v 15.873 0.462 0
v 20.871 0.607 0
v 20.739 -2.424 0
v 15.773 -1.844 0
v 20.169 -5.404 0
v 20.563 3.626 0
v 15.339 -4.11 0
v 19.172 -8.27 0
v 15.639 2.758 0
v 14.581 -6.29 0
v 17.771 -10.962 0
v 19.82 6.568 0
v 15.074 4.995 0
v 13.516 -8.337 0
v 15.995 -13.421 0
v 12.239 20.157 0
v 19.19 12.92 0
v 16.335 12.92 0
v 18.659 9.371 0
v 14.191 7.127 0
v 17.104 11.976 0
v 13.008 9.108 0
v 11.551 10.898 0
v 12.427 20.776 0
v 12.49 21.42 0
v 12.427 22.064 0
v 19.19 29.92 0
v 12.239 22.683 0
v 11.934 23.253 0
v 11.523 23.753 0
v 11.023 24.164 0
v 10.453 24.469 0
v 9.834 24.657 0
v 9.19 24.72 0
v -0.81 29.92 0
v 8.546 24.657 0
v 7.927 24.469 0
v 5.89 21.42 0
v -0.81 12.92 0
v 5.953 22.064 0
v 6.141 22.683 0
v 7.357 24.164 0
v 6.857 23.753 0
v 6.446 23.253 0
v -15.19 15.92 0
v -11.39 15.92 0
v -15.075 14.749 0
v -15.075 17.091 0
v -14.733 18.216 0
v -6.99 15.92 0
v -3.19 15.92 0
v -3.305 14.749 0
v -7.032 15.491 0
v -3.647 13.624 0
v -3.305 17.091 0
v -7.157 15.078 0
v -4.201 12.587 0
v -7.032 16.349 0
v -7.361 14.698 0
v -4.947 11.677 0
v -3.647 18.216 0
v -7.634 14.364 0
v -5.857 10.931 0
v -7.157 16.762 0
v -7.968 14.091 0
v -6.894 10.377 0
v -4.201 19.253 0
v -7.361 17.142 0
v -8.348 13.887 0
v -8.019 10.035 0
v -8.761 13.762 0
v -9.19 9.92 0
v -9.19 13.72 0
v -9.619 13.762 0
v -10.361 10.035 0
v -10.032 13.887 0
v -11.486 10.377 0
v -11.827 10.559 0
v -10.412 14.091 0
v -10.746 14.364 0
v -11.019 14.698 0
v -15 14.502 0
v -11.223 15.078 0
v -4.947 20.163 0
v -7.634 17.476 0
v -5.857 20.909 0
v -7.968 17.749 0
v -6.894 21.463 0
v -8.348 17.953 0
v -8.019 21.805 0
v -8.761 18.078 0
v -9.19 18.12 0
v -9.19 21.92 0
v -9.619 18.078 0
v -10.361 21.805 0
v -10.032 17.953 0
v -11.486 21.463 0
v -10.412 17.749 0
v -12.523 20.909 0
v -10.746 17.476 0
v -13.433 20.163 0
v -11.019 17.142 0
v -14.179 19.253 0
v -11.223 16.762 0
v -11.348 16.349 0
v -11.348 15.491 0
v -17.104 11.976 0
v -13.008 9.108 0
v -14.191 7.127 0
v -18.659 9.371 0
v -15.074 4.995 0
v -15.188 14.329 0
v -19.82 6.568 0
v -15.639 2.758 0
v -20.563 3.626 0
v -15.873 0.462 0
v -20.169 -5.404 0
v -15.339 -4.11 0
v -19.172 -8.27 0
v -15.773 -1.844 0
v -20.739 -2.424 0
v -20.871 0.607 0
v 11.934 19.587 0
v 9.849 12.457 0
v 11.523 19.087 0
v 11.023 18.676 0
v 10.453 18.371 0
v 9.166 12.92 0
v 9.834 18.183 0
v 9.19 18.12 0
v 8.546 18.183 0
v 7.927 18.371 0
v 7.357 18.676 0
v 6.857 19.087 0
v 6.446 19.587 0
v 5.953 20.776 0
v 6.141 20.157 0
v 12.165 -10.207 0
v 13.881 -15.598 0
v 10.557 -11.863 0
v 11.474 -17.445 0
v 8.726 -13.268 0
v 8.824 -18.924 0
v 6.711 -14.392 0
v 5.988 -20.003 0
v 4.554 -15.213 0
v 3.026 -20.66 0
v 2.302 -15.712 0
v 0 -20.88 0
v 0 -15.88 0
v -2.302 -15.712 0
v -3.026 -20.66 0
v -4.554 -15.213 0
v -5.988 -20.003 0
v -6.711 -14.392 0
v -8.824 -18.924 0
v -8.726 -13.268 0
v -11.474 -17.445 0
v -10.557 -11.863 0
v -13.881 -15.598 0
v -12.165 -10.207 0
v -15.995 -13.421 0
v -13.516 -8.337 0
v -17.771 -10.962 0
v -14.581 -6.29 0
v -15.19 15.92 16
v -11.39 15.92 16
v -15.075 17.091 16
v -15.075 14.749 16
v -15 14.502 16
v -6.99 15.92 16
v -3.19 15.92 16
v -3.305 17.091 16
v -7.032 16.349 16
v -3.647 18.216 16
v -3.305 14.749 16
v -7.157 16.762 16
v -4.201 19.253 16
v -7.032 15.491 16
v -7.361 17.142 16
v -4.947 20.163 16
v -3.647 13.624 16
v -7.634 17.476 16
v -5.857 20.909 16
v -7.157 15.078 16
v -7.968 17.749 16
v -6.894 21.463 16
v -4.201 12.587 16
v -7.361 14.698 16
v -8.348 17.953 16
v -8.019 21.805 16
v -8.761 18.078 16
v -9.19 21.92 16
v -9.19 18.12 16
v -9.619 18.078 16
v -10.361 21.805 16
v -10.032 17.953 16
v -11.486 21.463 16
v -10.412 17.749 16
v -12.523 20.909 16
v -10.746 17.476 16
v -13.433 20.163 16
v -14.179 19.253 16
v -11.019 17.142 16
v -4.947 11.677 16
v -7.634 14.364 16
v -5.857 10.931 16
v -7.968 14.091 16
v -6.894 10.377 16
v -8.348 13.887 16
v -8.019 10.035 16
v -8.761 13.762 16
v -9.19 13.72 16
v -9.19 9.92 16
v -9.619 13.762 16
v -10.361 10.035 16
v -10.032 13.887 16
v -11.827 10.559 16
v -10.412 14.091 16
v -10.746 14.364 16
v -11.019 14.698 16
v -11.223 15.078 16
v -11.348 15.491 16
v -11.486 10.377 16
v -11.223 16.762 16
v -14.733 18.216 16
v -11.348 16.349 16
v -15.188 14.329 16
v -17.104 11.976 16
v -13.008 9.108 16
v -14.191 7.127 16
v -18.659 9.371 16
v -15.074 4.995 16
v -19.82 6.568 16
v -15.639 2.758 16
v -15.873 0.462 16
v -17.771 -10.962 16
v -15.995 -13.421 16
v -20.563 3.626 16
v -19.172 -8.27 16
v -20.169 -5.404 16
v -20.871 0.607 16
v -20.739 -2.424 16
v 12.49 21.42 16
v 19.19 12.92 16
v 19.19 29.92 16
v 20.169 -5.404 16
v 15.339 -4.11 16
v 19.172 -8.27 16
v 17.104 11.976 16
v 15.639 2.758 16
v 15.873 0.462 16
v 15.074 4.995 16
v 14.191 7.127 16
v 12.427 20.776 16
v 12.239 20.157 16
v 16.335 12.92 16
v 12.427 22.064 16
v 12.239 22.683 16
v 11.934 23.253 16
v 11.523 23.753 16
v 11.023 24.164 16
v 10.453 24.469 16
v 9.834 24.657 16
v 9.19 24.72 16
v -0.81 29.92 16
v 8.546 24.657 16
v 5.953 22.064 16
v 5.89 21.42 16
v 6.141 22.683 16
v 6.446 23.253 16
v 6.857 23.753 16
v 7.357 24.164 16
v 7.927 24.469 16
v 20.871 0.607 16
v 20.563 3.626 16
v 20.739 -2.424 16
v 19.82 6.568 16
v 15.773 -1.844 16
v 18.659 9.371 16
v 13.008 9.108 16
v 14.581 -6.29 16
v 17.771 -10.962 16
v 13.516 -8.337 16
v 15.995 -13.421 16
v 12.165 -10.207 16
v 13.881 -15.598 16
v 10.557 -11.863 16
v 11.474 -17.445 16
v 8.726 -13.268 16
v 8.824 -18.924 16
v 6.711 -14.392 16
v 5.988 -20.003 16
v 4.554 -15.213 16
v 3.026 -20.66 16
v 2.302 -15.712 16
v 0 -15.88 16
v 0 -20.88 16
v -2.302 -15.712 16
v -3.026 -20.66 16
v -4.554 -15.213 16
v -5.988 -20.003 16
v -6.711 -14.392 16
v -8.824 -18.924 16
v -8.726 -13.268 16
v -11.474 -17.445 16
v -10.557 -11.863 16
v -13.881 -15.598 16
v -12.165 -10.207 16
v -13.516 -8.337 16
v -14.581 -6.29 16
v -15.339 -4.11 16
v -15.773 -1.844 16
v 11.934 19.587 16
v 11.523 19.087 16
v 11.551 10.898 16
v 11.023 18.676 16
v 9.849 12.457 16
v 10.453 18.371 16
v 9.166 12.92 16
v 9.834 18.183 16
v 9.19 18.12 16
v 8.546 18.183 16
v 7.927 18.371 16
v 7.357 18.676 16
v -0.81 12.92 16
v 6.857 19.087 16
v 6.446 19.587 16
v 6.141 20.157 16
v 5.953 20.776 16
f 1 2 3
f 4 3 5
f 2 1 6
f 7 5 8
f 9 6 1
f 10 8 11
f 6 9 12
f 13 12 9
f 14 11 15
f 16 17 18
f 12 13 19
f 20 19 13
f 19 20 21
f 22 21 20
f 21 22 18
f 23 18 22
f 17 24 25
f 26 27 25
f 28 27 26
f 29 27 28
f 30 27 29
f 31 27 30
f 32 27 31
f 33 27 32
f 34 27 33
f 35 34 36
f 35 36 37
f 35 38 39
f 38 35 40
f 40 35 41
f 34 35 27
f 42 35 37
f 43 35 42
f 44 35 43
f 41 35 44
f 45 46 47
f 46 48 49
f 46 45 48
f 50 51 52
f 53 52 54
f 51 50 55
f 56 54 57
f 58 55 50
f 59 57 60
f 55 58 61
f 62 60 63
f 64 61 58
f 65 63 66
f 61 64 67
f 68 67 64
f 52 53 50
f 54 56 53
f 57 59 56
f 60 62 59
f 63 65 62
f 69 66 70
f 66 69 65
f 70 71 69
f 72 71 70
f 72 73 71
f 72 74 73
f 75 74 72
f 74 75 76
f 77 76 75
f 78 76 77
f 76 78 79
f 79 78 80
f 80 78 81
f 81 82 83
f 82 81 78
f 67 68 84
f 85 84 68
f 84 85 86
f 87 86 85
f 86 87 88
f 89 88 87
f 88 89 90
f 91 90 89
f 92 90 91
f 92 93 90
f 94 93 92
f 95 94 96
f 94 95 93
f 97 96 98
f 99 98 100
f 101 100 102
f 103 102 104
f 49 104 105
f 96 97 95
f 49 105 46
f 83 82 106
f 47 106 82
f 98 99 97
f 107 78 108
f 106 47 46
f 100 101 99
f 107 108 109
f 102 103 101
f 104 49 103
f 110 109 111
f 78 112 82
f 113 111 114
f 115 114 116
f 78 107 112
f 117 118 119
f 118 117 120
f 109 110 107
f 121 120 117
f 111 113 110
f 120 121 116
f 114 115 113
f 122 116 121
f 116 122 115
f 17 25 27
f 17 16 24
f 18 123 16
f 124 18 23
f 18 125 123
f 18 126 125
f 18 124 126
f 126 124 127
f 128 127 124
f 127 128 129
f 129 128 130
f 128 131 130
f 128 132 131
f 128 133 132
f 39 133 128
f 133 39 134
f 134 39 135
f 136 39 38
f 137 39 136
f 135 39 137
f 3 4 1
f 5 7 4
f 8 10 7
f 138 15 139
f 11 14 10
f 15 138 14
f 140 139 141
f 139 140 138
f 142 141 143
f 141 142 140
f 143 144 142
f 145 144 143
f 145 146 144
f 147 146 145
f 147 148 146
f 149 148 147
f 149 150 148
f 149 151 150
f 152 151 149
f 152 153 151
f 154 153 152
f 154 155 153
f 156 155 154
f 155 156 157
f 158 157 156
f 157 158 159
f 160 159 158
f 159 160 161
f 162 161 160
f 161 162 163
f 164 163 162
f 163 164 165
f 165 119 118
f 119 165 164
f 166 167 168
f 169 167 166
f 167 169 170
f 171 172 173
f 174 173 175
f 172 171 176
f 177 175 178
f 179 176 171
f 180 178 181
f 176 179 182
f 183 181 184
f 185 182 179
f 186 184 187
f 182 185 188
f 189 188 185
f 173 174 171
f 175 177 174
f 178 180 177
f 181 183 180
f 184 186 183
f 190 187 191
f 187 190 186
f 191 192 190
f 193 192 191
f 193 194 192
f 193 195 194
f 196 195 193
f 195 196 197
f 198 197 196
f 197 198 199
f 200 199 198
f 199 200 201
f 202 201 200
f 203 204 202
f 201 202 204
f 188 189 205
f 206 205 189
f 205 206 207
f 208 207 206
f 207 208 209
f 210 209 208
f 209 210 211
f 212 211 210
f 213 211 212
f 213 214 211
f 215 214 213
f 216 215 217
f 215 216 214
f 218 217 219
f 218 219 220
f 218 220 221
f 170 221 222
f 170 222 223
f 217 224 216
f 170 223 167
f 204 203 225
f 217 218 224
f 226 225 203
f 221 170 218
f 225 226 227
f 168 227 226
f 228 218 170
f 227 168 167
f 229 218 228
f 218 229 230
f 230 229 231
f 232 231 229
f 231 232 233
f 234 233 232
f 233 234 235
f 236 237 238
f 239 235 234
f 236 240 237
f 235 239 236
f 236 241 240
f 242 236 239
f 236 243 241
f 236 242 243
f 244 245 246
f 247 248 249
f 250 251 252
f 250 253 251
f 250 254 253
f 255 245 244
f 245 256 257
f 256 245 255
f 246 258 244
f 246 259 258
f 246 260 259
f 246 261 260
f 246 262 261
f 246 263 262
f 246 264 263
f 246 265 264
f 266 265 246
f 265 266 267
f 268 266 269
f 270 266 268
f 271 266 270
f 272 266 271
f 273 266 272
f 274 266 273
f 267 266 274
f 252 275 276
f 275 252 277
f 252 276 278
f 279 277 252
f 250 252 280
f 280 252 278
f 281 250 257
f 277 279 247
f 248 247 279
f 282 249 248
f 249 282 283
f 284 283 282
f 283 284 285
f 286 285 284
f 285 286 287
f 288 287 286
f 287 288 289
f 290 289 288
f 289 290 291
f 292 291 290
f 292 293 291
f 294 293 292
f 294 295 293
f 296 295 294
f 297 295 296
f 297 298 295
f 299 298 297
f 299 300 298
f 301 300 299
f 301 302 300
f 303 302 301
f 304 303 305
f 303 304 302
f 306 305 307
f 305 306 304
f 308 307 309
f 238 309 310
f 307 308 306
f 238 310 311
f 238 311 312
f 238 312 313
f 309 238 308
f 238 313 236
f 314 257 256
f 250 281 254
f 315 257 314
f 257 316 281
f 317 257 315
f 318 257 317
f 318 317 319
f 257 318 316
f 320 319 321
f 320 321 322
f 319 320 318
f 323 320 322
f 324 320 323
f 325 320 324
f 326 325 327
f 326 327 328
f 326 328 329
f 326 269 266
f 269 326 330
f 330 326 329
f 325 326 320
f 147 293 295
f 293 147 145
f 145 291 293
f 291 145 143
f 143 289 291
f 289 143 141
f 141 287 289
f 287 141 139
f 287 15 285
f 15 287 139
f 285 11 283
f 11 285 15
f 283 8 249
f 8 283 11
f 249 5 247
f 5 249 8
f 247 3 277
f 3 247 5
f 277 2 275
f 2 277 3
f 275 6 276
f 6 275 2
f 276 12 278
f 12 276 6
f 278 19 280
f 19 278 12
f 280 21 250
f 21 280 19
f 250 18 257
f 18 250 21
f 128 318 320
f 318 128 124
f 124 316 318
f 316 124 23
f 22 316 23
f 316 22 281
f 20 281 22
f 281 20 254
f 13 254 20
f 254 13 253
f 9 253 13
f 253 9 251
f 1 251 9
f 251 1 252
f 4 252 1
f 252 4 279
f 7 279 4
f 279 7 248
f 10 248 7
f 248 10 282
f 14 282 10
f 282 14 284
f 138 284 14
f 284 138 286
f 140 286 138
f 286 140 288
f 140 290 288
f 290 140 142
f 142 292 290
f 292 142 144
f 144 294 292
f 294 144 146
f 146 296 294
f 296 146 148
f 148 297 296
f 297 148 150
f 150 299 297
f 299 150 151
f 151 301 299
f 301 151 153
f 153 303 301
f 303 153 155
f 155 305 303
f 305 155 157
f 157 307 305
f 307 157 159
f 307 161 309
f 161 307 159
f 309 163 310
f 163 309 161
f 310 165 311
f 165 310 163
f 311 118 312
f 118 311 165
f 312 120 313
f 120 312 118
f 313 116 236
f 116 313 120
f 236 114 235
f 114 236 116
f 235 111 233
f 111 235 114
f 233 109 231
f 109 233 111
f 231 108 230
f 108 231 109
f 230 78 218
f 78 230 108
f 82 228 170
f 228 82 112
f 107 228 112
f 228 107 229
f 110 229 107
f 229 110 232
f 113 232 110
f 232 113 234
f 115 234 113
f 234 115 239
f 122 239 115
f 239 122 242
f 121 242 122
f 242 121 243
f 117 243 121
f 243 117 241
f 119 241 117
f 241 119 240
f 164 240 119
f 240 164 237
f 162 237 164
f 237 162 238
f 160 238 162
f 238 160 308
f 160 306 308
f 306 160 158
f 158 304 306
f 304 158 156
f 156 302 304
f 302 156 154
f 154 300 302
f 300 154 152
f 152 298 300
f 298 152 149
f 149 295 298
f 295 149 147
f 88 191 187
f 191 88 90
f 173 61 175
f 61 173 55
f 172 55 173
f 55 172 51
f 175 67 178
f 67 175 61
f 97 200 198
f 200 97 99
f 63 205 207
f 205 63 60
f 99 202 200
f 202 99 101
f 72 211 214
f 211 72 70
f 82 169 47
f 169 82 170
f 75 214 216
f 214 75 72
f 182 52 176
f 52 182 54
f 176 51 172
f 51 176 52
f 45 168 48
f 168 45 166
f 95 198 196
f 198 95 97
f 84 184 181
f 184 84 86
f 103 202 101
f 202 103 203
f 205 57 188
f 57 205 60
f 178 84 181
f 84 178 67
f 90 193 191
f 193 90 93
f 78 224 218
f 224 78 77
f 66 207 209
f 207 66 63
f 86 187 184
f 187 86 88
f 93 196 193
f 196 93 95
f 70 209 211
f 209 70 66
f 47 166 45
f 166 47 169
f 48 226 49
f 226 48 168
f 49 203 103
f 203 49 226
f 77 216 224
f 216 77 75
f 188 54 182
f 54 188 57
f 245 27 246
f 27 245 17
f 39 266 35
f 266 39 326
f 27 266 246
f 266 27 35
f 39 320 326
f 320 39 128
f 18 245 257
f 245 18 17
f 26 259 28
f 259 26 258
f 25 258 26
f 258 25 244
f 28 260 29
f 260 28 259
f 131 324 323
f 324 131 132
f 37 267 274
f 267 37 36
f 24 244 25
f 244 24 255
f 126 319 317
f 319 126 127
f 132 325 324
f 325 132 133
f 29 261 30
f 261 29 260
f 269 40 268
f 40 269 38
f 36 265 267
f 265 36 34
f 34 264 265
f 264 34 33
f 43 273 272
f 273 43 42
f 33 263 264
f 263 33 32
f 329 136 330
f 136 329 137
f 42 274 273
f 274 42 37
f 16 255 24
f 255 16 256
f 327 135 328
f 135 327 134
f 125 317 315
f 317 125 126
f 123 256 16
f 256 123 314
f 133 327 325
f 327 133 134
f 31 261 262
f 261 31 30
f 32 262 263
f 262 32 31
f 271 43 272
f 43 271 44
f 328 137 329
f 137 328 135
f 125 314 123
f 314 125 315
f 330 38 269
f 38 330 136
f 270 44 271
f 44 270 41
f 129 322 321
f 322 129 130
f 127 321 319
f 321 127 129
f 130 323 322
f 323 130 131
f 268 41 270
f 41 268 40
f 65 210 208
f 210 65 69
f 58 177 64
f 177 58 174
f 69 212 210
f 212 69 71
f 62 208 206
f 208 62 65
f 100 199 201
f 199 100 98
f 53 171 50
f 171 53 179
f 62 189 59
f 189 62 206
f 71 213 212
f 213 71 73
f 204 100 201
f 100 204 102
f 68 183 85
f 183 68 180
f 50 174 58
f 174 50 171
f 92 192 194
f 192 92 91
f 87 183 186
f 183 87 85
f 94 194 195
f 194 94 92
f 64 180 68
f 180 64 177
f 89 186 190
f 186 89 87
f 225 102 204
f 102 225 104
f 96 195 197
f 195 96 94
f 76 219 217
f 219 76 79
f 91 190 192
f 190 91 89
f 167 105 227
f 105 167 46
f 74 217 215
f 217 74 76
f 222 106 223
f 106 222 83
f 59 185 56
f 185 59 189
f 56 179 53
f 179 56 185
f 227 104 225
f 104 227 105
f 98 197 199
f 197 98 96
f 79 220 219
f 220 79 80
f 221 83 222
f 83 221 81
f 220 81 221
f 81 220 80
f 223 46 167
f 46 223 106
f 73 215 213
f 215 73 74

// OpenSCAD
$fn = 32;

// ----------------------------------------------------------------------
// Pipe clamp: 41.76 mm ring, 5 mm wall, 16 mm wide
// ----------------------------------------------------------------------

// --- parameters (mm) ---
outer_r = 20.88;          // clamp outside radius
inner_r = 15.88;          // pipe bore radius
band = 5;                 // band thickness
clamp_w = 16;             // clamp width
opening = 60;             // opening angle between the ends
lug_w = 20;               // lug width
lug_len = 17;             // lug length
bolt_d = 6.6;             // bolt hole
knuckle_d = 12;           // hinge knuckle diameter
pin_d = 4.4;              // hinge pin hole

clamp_profile = [[-10.44, 18.083], [-12.951, 16.379], [-15.188, 14.329], [-17.104, 11.976], [-18.659, 9.371], [-19.82, 6.568], [-20.563, 3.626], [-20.871, 0.607], [-20.739, -2.424], [-20.169, -5.404], [-19.172, -8.27], [-17.771, -10.962], [-15.995, -13.421], [-13.881, -15.598], [-11.474, -17.445], [-8.824, -18.924], [-5.988, -20.003], [-3.026, -20.66], [0, -20.88], [3.026, -20.66], [5.988, -20.003], [8.824, -18.924], [11.474, -17.445], [13.881, -15.598], [15.995, -13.421], [17.771, -10.962], [19.172, -8.27], [20.169, -5.404], [20.739, -2.424], [20.871, 0.607], [20.563, 3.626], [19.82, 6.568], [18.659, 9.371], [17.104, 11.976], [15.188, 14.329], [12.951, 16.379], [10.44, 18.083], [7.94, 13.752], [9.849, 12.457], [11.551, 10.898], [13.008, 9.108], [14.191, 7.127], [15.074, 4.995], [15.639, 2.758], [15.873, 0.462], [15.773, -1.844], [15.339, -4.11], [14.581, -6.29], [13.516, -8.337], [12.165, -10.207], [10.557, -11.863], [8.726, -13.268], [6.711, -14.392], [4.554, -15.213], [2.302, -15.712], [0, -15.88], [-2.302, -15.712], [-4.554, -15.213], [-6.711, -14.392], [-8.726, -13.268], [-10.557, -11.863], [-12.165, -10.207], [-13.516, -8.337], [-14.581, -6.29], [-15.339, -4.11], [-15.773, -1.844], [-15.873, 0.462], [-15.639, 2.758], [-15.074, 4.995], [-14.191, 7.127], [-13.008, 9.108], [-11.551, 10.898], [-9.849, 12.457], [-7.94, 13.752]];

difference() {
  union() {
    linear_extrude(height = clamp_w) polygon(clamp_profile);
    /* hinge knuckle, sunk 2 mm into the band end */
    translate([-9.19, 15.92, 0]) cylinder(h = clamp_w, d = knuckle_d);
    /* bolt lug on the other end */
    translate([-0.81, 12.92, 0]) cube([lug_w, 17, clamp_w]);
  }
  translate([9.19, 21.42, -2.5]) cylinder(h = clamp_w + 5, d = bolt_d);
  translate([-9.19, 15.92, -2.5]) cylinder(h = clamp_w + 5, d = pin_d);
}
